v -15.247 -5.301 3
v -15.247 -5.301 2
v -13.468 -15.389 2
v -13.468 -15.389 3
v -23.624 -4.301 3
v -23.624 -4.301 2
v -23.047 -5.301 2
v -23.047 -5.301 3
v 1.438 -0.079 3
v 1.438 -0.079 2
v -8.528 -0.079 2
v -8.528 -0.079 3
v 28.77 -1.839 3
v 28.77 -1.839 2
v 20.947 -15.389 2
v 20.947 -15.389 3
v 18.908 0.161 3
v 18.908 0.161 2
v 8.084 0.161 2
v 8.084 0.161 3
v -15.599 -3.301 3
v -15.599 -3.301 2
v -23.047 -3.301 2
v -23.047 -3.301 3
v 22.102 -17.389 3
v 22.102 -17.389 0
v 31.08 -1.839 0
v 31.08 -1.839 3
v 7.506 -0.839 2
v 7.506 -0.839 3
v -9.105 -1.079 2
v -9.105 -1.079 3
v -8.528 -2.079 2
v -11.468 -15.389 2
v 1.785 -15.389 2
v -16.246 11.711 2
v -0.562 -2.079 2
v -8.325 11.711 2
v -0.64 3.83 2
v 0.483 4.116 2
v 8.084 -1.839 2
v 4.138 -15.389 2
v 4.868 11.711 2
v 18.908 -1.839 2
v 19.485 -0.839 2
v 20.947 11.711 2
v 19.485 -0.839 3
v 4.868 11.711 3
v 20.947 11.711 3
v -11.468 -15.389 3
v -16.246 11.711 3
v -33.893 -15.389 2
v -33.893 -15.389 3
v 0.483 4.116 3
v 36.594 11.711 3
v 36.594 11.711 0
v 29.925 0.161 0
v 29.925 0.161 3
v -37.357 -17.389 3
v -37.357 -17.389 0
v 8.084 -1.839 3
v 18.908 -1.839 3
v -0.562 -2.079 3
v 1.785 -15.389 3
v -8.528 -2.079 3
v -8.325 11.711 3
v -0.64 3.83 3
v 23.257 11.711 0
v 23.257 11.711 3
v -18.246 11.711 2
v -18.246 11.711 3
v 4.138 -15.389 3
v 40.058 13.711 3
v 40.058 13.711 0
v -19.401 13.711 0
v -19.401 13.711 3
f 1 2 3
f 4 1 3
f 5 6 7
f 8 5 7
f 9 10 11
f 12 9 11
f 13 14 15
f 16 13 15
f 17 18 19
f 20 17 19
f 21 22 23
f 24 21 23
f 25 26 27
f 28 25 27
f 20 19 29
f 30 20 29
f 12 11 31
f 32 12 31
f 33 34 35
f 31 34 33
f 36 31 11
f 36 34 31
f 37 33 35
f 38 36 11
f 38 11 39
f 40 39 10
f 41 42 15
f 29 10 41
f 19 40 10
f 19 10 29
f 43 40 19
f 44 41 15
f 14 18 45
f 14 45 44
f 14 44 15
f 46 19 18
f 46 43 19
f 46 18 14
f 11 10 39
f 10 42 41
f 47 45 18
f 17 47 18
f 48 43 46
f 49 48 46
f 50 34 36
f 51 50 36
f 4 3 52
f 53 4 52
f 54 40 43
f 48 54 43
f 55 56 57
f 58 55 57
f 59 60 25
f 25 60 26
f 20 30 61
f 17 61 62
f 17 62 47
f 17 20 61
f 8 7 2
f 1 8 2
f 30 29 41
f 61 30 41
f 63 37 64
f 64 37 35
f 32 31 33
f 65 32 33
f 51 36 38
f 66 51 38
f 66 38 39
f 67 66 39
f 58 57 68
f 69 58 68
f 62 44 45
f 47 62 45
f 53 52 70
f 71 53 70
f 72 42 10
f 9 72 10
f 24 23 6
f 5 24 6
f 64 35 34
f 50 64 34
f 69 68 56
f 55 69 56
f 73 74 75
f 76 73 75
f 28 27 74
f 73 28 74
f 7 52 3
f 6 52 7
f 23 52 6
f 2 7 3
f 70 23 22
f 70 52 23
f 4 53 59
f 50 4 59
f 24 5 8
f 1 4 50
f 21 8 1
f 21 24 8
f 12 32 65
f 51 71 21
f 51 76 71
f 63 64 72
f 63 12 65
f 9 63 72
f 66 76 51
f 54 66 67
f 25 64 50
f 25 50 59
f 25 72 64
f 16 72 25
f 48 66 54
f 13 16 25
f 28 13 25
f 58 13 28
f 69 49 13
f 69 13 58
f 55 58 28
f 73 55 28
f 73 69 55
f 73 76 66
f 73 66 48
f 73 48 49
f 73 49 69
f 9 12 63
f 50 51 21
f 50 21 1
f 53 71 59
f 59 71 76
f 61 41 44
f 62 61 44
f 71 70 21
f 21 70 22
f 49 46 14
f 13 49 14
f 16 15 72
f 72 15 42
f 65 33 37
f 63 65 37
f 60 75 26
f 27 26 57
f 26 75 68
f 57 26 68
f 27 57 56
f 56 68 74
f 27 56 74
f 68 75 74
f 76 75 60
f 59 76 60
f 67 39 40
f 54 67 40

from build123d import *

# Parameters (mm, degrees)
F1_DEPTH = 2
F2_DEPTH = 3


with BuildPart() as f1:
    # F0 (on Top) → F1 (new body)
    with BuildSketch(Plane.XY):
        Polygon((-18.2464108846, 11.7113475275), (-33.8927962614, -15.3889868999), (-13.4678907388, -15.3889868999), (-15.2466582433, -5.3010950903), (-23.0469053902, -5.3010950903), (-23.6242556594, -4.3010950903), (-23.0469053902, -3.3010950903), (-15.5993122047, -3.3010950903), align=None)
    extrude(amount=F1_DEPTH)



with BuildPart() as f1b:
    # F0 (on Top) → F1, piece 2 (new body)
    with BuildSketch(Plane.XY):
        Polygon((-16.2464108846, 11.7113475275), (-11.4678907388, -15.3889868999), (-0.5617896535, -15.3889868999), (1.4382103465, -15.3889868999), (1.7851558166, -15.3889868999), (-0.5617896535, -2.078797724), (-8.5276595022, -2.078797724), (-9.1050097714, -1.078797724), (-8.5276595022, -0.078797724), (1.4382103465, -0.078797724), (4.137809778, -15.3889868999), (20.9472483989, -15.3889868999), (28.7704410873, -1.8388196862), (20.9472483989, 11.7113475275), (4.8681087356, 11.7113475275), (0.4830753681, 4.1162469421), (-0.6402473631, 3.8304019006), (-8.3246870782, 11.7113475275), align=None)
        Polygon((19.4851677419, -0.8388196862), (18.9078174727, -1.8388196862), (8.0837683482, -1.8388196862), (7.5064180791, -0.8388196862), (8.0837683482, 0.1611803138), (18.9078174727, 0.1611803138), align=None, mode=Mode.SUBTRACT)
    extrude(amount=F1_DEPTH)


with BuildPart() as f1_1:
    add(f1.part)

    add(f1b.part)  # F2 merges F1b
    # F0 (on Top) → F2 (join)
    with BuildSketch(Plane.XY):
        Polygon((22.1019489373, 13.7113475275), (-19.401111423, 13.7113475275), (-37.3568978765, -17.3889868999), (-13.9558746851, -17.3889868999), (22.1019489373, -17.3889868999), (31.079842164, -1.8388196862), (40.0577353908, 13.7113475275), align=None)
        Polygon((-13.4678907388, -15.3889868999), (-33.8927962614, -15.3889868999), (-18.2464108846, 11.7113475275), (-16.2464108846, 11.7113475275), (-8.3246870782, 11.7113475275), (-5.5734554462, 11.7113475275), (4.8681087356, 11.7113475275), (20.9472483989, 11.7113475275), (28.7704410873, -1.8388196862), (20.9472483989, -15.3889868999), (4.137809778, -15.3889868999), (1.7851558166, -15.3889868999), (1.4382103465, -15.3889868999), (-0.5617896535, -15.3889868999), (-11.4678907388, -15.3889868999), align=None, mode=Mode.SUBTRACT)
        Polygon((36.5936337757, 11.7113475275), (29.9251416257, 0.1611803138), (23.2566494757, 11.7113475275), align=None, mode=Mode.SUBTRACT)
        Polygon((-23.0469053902, -5.3010950903), (-15.2466582433, -5.3010950903), (-15.5993122047, -3.3010950903), (-23.0469053902, -3.3010950903), (-23.6242556594, -4.3010950903), align=None)
        Polygon((-15.2466582433, -5.3010950903), (-13.4678907388, -15.3889868999), (-11.4678907388, -15.3889868999), (-16.2464108846, 11.7113475275), (-18.2464108846, 11.7113475275), (-15.5993122047, -3.3010950903), align=None)
        Polygon((-0.5617896535, -2.078797724), (1.7851558166, -15.3889868999), (4.137809778, -15.3889868999), (1.4382103465, -0.078797724), (-8.5276595022, -0.078797724), (-9.1050097714, -1.078797724), (-8.5276595022, -2.078797724), align=None)
        Polygon((-5.5734554462, 11.7113475275), (-8.3246870782, 11.7113475275), (-0.6402473631, 3.8304019006), (0.4830753681, 4.1162469421), (0.7917058952, 5.2266503978), align=None)
        Polygon((4.8681087356, 11.7113475275), (-5.5734554462, 11.7113475275), (0.7917058952, 5.2266503978), (0.4830753681, 4.1162469421), align=None)
        Polygon((8.0837683482, -1.8388196862), (18.9078174727, -1.8388196862), (19.4851677419, -0.8388196862), (18.9078174727, 0.1611803138), (8.0837683482, 0.1611803138), (7.5064180791, -0.8388196862), align=None)
    extrude(amount=F2_DEPTH)


solid = f1_1.part
